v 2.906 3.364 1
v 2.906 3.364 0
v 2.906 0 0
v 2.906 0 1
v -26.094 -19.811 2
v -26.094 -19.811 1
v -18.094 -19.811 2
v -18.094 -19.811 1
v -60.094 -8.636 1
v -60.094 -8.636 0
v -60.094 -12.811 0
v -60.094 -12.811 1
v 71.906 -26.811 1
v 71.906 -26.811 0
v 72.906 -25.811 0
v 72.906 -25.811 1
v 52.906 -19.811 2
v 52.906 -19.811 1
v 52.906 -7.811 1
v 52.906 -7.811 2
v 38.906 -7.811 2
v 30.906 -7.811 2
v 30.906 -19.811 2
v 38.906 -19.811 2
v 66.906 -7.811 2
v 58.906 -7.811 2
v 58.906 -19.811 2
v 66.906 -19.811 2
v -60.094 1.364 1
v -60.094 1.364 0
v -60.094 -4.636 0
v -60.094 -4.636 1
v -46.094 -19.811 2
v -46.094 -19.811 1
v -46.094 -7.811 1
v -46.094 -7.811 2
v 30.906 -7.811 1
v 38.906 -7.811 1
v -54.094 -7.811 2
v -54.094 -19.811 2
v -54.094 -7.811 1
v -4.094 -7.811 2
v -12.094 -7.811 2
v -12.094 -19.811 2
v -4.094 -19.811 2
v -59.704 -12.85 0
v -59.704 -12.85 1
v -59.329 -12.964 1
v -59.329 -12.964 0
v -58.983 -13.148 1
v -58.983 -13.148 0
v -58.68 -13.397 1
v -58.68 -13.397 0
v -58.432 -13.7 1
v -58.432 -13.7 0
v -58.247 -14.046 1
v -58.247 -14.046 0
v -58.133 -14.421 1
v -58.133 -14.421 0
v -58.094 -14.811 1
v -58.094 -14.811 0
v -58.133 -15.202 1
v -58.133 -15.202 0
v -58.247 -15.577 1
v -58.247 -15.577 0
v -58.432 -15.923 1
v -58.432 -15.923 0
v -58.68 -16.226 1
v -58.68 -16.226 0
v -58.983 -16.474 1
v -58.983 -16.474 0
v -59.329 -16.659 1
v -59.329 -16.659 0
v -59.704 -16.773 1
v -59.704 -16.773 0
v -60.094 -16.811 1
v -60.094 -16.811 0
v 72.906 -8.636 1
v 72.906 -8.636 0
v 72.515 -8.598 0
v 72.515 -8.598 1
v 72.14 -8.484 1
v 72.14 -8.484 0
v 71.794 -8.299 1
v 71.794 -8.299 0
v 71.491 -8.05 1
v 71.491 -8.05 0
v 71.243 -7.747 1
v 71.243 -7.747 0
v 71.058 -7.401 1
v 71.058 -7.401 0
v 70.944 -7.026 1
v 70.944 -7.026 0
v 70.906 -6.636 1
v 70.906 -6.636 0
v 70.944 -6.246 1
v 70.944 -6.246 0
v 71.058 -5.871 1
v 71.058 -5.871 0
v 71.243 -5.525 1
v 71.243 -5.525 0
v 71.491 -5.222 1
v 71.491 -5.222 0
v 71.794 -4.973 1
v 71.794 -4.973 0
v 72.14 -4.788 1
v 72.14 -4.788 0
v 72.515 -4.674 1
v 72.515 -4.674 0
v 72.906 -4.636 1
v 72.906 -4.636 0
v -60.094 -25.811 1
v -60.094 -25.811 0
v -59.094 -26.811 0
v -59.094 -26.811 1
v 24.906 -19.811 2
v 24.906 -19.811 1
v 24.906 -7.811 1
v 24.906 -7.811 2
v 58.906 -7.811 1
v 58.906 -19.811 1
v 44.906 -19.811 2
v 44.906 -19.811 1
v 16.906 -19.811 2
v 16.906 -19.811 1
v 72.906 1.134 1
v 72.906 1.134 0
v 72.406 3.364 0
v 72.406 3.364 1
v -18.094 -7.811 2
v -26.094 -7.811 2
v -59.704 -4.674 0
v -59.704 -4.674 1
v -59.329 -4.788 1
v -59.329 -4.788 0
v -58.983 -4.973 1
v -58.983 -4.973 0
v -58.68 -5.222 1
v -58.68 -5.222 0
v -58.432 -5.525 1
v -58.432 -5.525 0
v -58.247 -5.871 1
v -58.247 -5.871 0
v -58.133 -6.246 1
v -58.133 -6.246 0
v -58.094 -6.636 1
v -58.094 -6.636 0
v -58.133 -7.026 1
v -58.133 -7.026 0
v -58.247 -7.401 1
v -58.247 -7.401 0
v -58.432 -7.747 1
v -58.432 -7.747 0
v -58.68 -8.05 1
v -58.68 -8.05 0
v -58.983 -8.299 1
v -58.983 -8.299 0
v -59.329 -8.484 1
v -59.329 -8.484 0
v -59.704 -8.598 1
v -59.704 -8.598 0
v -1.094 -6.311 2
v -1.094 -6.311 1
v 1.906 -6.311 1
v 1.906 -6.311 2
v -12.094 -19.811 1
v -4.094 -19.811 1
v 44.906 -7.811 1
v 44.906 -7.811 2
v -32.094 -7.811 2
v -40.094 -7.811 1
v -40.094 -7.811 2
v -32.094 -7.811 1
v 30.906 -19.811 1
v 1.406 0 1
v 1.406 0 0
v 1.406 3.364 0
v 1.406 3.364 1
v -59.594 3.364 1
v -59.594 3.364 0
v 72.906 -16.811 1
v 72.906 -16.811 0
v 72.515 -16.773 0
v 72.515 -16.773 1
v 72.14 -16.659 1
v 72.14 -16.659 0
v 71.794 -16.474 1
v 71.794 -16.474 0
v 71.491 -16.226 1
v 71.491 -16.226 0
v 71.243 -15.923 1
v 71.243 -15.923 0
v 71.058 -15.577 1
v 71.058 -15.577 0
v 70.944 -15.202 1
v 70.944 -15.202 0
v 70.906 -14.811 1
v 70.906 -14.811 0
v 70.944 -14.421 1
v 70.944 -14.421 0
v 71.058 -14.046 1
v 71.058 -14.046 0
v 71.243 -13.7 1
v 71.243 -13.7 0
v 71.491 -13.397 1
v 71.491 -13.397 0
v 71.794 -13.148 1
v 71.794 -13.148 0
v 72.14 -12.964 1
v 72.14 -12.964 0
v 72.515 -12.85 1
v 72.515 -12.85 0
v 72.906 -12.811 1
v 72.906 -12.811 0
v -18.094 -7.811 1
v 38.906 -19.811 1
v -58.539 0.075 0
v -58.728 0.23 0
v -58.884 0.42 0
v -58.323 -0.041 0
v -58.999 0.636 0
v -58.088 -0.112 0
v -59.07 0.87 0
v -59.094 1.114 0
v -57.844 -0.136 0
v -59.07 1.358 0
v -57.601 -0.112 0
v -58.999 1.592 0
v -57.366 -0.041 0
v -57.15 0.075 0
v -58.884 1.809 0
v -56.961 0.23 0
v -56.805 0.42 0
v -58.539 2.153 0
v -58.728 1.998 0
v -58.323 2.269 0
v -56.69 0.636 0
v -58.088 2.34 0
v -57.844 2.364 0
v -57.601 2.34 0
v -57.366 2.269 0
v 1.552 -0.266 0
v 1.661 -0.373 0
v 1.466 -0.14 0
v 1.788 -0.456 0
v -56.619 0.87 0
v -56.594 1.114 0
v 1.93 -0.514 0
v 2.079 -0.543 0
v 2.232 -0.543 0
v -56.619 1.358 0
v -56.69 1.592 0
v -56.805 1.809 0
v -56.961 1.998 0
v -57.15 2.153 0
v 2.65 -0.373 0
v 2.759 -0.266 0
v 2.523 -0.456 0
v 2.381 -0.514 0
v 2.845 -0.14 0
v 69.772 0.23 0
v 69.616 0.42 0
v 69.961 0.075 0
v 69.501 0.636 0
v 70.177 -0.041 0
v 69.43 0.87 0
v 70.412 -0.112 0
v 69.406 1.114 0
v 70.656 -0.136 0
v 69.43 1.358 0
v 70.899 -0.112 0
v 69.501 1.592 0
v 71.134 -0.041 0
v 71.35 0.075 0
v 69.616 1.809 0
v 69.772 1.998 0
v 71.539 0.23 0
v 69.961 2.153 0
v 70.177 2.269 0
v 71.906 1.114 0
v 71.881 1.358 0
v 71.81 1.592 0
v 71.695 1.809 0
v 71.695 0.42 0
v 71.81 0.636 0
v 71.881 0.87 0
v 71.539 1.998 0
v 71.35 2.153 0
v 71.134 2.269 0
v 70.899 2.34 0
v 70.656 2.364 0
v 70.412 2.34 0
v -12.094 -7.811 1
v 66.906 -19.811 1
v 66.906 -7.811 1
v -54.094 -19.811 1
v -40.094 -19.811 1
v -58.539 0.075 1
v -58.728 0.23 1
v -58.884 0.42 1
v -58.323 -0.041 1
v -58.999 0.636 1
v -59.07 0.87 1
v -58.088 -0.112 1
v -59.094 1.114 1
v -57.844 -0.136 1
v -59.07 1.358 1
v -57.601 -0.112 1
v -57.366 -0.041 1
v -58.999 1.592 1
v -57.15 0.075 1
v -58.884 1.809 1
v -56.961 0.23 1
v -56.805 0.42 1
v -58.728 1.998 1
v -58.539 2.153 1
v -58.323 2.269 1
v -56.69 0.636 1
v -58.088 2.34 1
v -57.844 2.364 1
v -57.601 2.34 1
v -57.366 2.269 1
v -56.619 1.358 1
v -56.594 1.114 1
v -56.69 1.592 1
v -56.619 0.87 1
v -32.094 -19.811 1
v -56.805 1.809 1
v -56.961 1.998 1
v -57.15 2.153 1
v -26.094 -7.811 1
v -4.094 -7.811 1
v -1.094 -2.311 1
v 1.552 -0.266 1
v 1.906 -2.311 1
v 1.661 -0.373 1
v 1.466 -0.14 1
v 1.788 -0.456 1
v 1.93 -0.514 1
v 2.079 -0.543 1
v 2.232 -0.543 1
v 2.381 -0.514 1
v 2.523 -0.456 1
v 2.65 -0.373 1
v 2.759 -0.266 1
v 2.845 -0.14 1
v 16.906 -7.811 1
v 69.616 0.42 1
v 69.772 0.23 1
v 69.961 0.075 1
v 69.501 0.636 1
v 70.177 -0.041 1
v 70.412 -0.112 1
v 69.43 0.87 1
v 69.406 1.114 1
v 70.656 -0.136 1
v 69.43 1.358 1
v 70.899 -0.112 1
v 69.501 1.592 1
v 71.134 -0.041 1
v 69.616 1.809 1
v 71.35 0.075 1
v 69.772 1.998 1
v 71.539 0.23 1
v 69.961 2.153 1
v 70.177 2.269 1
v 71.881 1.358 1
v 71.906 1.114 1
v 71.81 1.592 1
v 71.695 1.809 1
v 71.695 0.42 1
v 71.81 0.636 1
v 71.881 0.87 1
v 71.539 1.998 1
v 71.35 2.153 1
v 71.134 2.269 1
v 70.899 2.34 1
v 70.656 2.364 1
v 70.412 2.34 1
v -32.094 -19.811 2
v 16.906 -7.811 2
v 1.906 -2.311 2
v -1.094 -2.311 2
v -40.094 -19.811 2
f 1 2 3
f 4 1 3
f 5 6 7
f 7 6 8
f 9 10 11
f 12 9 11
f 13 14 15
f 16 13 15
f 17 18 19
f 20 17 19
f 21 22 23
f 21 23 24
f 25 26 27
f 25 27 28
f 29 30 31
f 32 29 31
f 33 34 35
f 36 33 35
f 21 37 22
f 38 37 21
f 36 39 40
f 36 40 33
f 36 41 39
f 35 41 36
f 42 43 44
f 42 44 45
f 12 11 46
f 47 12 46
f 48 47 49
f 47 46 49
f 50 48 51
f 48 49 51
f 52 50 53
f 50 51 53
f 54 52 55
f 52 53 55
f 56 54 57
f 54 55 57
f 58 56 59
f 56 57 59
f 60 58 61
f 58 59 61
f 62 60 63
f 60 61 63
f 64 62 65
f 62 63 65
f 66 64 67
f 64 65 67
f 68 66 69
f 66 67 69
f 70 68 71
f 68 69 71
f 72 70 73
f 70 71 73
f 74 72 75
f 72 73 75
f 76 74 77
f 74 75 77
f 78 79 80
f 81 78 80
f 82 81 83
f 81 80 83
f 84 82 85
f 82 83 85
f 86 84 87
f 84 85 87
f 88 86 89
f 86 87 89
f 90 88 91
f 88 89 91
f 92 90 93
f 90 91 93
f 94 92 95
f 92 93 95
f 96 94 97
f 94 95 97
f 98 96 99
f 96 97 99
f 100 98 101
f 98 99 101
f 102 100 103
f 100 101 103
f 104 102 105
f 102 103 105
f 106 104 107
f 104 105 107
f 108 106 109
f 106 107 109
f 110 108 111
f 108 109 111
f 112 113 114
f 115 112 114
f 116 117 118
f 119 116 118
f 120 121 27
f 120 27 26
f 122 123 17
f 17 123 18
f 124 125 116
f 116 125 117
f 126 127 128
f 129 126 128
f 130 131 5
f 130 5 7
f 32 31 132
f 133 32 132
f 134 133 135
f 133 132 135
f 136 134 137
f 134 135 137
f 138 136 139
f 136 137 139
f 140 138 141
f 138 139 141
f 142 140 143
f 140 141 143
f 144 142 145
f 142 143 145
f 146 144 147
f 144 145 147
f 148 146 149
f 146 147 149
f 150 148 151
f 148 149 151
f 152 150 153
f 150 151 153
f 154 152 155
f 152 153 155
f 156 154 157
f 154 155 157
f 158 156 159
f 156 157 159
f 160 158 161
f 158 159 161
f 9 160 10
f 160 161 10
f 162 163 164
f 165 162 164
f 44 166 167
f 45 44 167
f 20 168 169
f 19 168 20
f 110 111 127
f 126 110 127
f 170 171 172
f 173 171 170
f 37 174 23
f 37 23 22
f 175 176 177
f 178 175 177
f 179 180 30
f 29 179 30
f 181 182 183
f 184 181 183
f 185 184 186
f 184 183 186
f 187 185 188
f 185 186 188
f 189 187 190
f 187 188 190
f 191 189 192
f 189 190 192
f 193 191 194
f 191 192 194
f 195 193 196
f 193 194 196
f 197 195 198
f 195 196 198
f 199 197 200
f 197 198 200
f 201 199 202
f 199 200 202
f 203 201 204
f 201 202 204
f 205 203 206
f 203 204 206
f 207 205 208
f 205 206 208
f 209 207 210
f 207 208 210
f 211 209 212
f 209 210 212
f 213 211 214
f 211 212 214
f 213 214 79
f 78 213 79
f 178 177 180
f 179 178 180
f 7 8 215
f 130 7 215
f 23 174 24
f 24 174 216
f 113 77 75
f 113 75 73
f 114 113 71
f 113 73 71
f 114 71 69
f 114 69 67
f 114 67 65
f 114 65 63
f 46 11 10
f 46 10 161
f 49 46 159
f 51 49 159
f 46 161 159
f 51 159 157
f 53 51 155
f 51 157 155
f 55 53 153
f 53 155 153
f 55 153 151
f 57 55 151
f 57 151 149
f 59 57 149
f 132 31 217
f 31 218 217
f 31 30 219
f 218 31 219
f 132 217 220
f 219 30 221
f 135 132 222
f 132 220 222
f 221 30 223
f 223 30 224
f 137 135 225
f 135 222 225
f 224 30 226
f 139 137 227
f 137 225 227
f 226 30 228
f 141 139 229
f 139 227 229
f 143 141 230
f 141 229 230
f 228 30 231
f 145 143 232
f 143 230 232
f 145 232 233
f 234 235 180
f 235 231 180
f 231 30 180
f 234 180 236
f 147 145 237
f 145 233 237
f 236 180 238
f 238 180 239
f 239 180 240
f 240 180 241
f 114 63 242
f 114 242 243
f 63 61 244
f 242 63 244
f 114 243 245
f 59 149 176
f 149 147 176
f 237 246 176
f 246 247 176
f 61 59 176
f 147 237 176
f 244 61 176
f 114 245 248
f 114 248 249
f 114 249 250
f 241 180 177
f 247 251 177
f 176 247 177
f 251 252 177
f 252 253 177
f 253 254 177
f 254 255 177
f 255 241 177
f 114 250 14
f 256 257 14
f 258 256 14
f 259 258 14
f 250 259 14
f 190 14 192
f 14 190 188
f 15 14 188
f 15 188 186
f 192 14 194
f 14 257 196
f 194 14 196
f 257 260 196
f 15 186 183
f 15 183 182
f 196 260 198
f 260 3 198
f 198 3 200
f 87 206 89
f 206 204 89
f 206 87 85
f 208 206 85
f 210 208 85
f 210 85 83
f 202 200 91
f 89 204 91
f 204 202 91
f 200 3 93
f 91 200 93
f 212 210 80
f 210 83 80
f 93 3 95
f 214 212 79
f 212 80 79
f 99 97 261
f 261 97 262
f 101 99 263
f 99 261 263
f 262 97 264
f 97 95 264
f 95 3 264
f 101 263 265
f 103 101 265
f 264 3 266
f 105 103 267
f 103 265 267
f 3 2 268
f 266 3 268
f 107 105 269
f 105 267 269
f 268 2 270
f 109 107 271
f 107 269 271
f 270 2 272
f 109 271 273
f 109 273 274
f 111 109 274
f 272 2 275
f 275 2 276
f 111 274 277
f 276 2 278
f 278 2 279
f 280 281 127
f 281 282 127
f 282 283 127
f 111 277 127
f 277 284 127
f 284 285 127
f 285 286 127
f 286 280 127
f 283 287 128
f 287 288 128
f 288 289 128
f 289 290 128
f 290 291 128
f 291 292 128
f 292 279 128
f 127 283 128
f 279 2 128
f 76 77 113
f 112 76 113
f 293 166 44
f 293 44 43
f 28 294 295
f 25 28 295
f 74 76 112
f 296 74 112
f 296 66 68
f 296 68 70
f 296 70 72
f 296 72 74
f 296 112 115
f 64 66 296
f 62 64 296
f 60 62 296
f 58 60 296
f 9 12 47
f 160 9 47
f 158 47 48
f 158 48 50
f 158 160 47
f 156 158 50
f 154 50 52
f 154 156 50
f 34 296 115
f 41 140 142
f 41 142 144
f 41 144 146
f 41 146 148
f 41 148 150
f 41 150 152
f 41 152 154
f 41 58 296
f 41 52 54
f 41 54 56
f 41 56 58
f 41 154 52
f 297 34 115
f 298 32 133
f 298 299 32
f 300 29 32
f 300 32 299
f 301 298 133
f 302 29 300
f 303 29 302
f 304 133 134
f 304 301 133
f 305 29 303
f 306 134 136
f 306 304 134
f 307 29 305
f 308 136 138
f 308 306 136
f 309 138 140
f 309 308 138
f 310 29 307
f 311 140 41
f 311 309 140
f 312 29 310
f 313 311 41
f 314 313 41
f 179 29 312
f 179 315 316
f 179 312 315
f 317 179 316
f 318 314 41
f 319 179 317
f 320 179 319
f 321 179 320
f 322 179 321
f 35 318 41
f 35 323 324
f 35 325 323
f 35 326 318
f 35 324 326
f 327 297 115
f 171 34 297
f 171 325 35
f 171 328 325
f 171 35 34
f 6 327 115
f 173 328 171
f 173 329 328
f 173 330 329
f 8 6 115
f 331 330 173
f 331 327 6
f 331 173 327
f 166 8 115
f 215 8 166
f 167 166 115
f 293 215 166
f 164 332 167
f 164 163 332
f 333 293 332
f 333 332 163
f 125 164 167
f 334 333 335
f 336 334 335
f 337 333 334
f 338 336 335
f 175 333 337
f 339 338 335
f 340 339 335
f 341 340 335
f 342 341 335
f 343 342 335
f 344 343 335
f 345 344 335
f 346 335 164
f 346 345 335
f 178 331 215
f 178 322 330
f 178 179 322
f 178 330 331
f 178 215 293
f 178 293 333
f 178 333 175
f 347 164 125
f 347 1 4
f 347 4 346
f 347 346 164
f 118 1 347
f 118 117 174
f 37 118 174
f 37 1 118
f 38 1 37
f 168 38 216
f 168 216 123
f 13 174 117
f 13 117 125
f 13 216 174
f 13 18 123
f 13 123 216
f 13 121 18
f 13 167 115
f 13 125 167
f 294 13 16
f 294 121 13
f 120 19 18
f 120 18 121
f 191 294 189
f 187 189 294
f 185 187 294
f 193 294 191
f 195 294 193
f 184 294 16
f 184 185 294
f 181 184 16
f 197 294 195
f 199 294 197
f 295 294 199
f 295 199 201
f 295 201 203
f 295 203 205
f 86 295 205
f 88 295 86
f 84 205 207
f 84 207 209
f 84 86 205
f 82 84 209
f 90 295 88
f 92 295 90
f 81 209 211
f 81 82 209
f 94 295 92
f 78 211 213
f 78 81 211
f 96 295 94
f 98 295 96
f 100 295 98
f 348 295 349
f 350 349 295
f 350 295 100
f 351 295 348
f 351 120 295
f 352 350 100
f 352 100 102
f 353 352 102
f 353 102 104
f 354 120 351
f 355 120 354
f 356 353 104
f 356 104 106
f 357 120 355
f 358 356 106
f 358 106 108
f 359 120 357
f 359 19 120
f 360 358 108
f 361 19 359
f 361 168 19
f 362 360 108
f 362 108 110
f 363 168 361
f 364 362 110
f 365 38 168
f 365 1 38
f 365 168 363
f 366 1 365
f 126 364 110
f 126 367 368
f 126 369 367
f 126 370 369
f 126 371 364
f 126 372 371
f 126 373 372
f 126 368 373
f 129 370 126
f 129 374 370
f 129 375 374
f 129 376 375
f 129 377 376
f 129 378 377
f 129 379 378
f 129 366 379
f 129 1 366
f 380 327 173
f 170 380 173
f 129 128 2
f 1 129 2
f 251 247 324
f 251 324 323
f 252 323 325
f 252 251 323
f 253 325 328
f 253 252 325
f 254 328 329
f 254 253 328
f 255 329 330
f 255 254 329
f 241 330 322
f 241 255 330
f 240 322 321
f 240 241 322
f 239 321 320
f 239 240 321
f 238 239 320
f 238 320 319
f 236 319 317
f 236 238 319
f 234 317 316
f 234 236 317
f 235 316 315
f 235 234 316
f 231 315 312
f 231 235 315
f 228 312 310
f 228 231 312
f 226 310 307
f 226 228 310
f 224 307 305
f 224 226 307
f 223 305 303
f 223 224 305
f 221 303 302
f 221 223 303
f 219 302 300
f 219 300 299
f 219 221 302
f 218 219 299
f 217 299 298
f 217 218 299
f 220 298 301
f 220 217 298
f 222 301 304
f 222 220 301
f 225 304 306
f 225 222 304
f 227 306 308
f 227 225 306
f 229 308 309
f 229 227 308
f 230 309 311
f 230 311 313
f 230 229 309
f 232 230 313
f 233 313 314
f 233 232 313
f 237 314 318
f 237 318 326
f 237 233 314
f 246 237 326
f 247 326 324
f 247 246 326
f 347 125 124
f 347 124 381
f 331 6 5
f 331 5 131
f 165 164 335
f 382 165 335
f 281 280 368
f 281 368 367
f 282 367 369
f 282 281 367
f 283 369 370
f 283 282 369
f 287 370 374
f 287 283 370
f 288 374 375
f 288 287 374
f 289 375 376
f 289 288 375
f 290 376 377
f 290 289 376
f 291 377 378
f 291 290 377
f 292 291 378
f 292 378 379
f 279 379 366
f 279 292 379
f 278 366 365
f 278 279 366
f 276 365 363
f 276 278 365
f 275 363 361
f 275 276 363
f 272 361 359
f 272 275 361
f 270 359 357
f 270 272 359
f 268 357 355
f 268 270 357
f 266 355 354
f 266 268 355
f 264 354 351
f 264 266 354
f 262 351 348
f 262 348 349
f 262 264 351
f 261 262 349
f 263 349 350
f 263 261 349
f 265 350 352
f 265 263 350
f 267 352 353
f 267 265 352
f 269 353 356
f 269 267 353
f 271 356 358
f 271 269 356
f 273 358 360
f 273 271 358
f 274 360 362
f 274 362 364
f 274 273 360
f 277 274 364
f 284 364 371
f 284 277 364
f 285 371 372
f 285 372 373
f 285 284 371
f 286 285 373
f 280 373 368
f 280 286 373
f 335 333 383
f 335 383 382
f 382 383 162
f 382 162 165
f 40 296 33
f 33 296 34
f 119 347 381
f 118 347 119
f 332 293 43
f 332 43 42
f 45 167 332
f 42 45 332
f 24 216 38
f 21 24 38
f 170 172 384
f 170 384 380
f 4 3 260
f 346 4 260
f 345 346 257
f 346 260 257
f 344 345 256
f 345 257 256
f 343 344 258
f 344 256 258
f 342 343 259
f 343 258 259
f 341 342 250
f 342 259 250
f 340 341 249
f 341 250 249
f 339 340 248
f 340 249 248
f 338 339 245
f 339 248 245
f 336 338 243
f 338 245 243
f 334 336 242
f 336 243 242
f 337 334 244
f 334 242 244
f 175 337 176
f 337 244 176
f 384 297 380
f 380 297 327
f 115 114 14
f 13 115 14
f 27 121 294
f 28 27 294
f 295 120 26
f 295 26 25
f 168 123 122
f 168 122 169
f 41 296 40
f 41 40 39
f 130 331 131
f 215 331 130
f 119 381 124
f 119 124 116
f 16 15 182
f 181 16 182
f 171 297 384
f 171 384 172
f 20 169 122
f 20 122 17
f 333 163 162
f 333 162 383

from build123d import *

# Parameters (mm, degrees)
F0_R     = 1.25
F1_DEPTH = 1
F2_W     = 8
F2_H     = 12
F2_W_2   = 3
F2_H_2   = 4
F3_DEPTH = 1


with BuildPart() as f1:
    # F0 (on Top) → F1 (new body)
    with BuildSketch(Plane.XY):
        with BuildLine():
            Line((1.405504, 3.364061), (-59.594496, 3.364061))
            Line((-59.594496, 3.364061), (-60.094496, 1.364061))
            Line((-60.094496, 1.364061), (-60.094496, -4.635939))
            ThreePointArc((-60.094496, -4.635939), (-58.094496, -6.635939), (-60.094496, -8.635939))
            Line((-60.094496, -8.635939), (-60.094496, -12.811412))
            ThreePointArc((-60.094496, -12.811412), (-58.094496, -14.811412), (-60.094496, -16.811412))
            Line((-60.094496, -16.811412), (-60.094496, -25.811412))
            Line((-60.094496, -25.811412), (-59.094496, -26.811412))
            Line((-59.094496, -26.811412), (71.905504, -26.811412))
            Line((71.905504, -26.811412), (72.905504, -25.811412))
            Line((72.905504, -25.811412), (72.905504, -16.811412))
            ThreePointArc((72.905504, -16.811412), (70.905504, -14.811412), (72.905504, -12.811412))
            Line((72.905504, -12.811412), (72.905504, -8.635939))
            ThreePointArc((72.905504, -8.635939), (70.905504, -6.635939), (72.905504, -4.635939))
            Line((72.905504, -4.635939), (72.905504, 1.133777))
            Line((72.905504, 1.133777), (72.405504, 3.364061))
            Line((72.405504, 3.364061), (2.905504, 3.364061))
            Line((2.905504, 3.364061), (2.905504, 0))
            ThreePointArc((2.905504, 0), (2.155504, -0.547161), (1.405504, 0))
            Line((1.405504, 0), (1.405504, 3.364061))
        make_face()
        with Locations((-57.844496, 1.114061)):
            Circle(F0_R, mode=Mode.SUBTRACT)
        with Locations((70.655504, 1.114061)):
            Circle(F0_R, mode=Mode.SUBTRACT)
    extrude(amount=F1_DEPTH)

    # F2 (on face) → F3 (join)
    with BuildSketch(Plane.XY.offset(1)):
        with Locations((-50.094496, -13.811412)):
            Rectangle(F2_W, F2_H)
        with Locations((-36.094496, -13.811412)):
            Rectangle(F2_W, F2_H)
        with Locations((-22.094496, -13.811412)):
            Rectangle(F2_W, F2_H)
        with Locations((-8.094496, -13.811412)):
            Rectangle(F2_W, F2_H)
        with Locations((62.905504, -13.811412)):
            Rectangle(F2_W, F2_H)
        with Locations((48.905504, -13.811412)):
            Rectangle(F2_W, F2_H)
        with Locations((34.905504, -13.811412)):
            Rectangle(F2_W, F2_H)
        with Locations((20.905504, -13.811412)):
            Rectangle(F2_W, F2_H)
        with Locations((0.405504, -4.311412)):
            Rectangle(F2_W_2, F2_H_2)
    extrude(amount=F3_DEPTH)


solid = f1.part
